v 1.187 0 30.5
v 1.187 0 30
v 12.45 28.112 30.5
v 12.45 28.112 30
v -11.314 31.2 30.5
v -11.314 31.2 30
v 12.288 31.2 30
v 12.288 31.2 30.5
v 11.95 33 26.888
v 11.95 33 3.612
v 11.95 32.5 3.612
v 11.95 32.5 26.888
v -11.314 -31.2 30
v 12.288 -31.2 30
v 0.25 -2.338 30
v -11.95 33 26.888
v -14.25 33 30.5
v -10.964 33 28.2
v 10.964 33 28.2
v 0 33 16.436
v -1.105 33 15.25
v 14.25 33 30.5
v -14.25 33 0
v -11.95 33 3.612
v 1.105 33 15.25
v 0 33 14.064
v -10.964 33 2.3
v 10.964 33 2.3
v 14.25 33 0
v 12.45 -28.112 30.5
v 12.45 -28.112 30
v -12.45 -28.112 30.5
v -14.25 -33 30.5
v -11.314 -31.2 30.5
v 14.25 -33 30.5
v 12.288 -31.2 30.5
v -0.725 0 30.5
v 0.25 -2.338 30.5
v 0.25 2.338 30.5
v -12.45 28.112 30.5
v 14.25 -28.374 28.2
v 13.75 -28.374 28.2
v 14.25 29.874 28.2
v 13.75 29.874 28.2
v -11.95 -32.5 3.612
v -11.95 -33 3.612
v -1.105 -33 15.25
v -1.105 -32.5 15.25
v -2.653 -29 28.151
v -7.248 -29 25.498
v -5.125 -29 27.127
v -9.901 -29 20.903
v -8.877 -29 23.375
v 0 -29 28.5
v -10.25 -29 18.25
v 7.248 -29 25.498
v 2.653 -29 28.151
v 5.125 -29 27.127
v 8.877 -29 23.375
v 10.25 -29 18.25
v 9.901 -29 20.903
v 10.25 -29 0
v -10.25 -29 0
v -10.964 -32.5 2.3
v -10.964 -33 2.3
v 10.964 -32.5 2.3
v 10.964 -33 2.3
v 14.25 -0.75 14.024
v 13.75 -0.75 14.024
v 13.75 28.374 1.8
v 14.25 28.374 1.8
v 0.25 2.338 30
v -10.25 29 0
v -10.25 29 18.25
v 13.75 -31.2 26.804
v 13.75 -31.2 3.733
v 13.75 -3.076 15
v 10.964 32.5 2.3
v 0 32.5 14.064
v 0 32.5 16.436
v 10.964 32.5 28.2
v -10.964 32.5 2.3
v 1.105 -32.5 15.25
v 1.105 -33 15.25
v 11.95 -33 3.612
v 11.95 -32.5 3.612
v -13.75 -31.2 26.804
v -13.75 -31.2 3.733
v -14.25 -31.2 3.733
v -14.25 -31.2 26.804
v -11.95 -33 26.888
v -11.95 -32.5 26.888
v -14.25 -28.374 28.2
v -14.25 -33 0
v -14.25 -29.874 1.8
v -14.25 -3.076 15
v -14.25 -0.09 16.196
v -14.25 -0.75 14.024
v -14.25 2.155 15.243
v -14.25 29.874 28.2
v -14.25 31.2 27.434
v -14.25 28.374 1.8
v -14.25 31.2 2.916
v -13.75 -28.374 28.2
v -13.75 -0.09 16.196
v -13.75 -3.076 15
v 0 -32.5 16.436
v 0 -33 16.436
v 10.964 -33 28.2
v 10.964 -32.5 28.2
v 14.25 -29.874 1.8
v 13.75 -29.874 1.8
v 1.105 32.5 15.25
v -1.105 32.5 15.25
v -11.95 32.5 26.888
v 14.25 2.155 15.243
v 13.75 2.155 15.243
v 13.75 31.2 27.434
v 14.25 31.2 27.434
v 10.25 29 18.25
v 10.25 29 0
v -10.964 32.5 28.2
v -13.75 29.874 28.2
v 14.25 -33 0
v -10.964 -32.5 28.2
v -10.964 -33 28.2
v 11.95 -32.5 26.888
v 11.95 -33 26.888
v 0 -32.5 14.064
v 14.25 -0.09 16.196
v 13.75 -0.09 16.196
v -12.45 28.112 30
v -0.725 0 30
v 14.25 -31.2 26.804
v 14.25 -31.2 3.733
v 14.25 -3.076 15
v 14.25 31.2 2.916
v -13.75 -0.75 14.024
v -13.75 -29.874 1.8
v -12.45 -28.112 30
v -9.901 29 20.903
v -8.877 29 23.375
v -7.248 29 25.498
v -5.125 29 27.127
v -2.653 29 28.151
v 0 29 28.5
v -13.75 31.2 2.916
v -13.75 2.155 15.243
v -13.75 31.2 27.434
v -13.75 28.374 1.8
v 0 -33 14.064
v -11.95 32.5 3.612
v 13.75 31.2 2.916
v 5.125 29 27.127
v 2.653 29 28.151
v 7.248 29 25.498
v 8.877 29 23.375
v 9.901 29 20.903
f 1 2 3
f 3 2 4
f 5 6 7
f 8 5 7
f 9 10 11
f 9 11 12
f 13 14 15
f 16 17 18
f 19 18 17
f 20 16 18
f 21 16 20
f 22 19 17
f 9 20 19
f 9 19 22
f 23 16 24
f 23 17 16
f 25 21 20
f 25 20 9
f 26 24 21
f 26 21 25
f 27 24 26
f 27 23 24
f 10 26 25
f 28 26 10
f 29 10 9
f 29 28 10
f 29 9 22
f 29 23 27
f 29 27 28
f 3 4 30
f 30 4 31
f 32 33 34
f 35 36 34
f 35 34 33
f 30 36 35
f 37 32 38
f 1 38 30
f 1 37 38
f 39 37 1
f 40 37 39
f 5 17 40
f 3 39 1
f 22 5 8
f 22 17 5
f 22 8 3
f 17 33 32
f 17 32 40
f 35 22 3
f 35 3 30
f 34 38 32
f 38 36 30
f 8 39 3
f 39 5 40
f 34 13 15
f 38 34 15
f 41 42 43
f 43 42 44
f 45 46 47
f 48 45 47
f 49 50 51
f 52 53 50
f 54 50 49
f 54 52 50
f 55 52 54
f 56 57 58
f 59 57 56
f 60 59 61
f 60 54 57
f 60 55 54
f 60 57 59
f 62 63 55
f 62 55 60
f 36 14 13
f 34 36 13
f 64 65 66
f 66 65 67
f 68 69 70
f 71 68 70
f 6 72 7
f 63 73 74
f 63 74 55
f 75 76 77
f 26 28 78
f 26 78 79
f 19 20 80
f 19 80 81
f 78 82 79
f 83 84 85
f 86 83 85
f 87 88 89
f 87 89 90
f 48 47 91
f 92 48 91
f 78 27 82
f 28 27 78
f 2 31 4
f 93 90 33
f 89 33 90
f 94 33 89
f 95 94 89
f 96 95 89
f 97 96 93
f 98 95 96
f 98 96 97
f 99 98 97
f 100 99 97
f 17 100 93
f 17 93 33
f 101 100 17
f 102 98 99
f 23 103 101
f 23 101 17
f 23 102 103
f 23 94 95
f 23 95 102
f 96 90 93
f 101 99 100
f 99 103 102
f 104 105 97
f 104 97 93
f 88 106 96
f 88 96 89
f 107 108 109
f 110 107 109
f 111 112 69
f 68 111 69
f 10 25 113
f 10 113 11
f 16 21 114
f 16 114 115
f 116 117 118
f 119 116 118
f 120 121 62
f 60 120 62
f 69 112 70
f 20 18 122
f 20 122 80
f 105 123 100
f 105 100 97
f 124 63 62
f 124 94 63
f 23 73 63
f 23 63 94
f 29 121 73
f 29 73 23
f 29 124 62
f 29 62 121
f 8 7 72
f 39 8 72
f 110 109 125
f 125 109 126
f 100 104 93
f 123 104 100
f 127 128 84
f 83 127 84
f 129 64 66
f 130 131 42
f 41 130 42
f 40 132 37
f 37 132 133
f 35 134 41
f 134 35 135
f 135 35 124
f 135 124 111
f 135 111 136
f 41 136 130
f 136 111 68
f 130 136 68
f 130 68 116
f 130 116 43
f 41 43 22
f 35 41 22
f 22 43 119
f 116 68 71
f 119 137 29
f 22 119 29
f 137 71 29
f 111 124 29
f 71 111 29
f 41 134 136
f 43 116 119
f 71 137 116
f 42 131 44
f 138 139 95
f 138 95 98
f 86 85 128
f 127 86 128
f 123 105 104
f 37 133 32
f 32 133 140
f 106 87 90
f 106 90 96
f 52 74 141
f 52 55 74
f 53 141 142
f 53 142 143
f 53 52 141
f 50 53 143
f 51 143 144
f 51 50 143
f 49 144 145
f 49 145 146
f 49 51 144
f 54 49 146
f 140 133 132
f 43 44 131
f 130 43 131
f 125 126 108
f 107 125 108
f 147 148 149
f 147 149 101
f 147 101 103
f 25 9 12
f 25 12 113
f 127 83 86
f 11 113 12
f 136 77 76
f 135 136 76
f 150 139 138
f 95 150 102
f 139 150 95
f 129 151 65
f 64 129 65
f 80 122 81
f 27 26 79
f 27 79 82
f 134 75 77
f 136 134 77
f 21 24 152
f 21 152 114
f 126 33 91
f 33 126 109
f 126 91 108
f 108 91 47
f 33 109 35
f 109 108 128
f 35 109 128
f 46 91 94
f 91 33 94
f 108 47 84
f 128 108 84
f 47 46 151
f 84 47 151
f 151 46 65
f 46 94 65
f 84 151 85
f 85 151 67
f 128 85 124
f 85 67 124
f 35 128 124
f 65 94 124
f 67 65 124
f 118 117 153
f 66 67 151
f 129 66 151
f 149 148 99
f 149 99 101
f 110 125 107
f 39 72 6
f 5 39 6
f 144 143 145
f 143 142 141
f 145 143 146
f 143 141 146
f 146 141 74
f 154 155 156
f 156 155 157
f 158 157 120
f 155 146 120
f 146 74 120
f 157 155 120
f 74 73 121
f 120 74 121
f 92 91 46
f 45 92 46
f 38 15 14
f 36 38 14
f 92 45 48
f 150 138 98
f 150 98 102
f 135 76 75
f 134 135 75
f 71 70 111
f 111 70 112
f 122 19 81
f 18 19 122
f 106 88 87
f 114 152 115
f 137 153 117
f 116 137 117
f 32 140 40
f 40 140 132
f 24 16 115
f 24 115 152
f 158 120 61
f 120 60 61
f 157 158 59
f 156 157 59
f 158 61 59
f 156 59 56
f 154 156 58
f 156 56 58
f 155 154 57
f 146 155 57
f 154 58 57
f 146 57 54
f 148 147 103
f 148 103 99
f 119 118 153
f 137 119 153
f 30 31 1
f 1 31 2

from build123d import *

# Parameters (mm, degrees)
F0_W     = 27.5
F0_H     = 66
F1_DEPTH = 30
F2_W     = 66
F2_H     = 30
F3_DEPTH = 0.5
F4_W     = 28.5
F4_H     = 66
F5_DEPTH = 0.5
F7_DEPTH = 0.5
F8_W     = 20.5
F8_H     = 58
F9_DEPTH = 28.5
F10_R    = 10.24999


# Not quite as in the source:
# - two fillets or chamfers of one size are made in one step
# - a fillet or chamfer is up to 0.001 mm smaller than in the source, because OpenCascade refuses the exact size
# - a pattern or mirror of a feature is missing from the dataset's text; its kind, count and spacing are read off the source's solid


with BuildPart() as f1:
    # F0 (on Top) → F1 (new body)
    with BuildSketch(Plane.XY):
        Rectangle(F0_W, F0_H)
    extrude(amount=F1_DEPTH)

    # F2 (on face) → F3 (join)
    with BuildSketch(Plane.YZ.offset(13.75)):
        with Locations((0, 15)):
            Rectangle(F2_W, F2_H)
        Polygon((28.3744677029, 1.8), (-29.8744677029, 1.8), (-0.75, 14.0239419294), align=None, mode=Mode.SUBTRACT)
        Polygon((-31.2, 3.7331419218), (-31.2, 26.8042280979), (-3.0755322971, 15), align=None, mode=Mode.SUBTRACT)
        Polygon((-0.0901844103, 16.195951202), (-28.3744677029, 28.2), (29.8744677029, 28.2), align=None, mode=Mode.SUBTRACT)
        Polygon((31.2, 27.4337988451), (31.2, 2.9161768244), (2.1548442575, 15.2431452425), align=None, mode=Mode.SUBTRACT)
    f3 = extrude(amount=F3_DEPTH)

    # F3_copies: F3 across plane
    add(f3.mirror(Plane(origin=(0, 0, 0), x_dir=(0, 0, -1), z_dir=(-1, 0, 0))))

    # F4 (on face) → F5 (join)
    with BuildSketch(Plane.XY.offset(30)):
        Rectangle(F4_W, F4_H)
        Polygon((0.25, -2.338037696), (12.2876657229, -31.2), (-11.3137418755, -31.2), align=None, mode=Mode.SUBTRACT)
        Polygon((-0.7251421589, 0), (-12.45, -28.111962304), (-12.45, 28.111962304), align=None, mode=Mode.SUBTRACT)
        Polygon((1.1867507353, 0), (12.45, 28.111962304), (12.45, -28.111962304), align=None, mode=Mode.SUBTRACT)
        Polygon((0.25, 2.338037696), (-11.3137418755, 31.2), (12.2876657229, 31.2), align=None, mode=Mode.SUBTRACT)
    extrude(amount=F5_DEPTH)

    # F6 (on face) → F7 (cut)
    with BuildSketch(Plane.XZ.offset(33)):
        Polygon((0, 14.0644738981), (-10.9635152767, 2.3), (10.9635152767, 2.3), align=None)
        Polygon((-1.1048121354, 15.25), (-11.95, 26.8875018716), (-11.95, 3.6124981284), align=None)
        Polygon((0, 16.4355261019), (10.9635152767, 28.2), (-10.9635152767, 28.2), align=None)
        Polygon((1.1048121354, 15.25), (11.95, 3.6124981284), (11.95, 26.8875018716), align=None)
    f7 = extrude(amount=-F7_DEPTH, mode=Mode.SUBTRACT)

    # F7_copies: F7 across plane
    add(f7.mirror(Plane.ZX), mode=Mode.SUBTRACT)

    # F8 (on face) → F9 (cut)
    with BuildSketch(Plane(origin=(0, 0, 0), x_dir=(1, 0, 0), z_dir=(0, 0, -1))):
        Rectangle(F8_W, F8_H)
    extrude(amount=-F9_DEPTH, mode=Mode.SUBTRACT)

    # F10 (radius 10.25 in the source; OpenCascade refuses exactly that, so slightly less here)
    f10_edges = [f1.edges().sort_by_distance(p)[0] for p in [
        (-10.25, 0, 28.5),
        (10.25, 0, 28.5),
    ]]
    fillet(f10_edges, radius=F10_R)


solid = f1.part
